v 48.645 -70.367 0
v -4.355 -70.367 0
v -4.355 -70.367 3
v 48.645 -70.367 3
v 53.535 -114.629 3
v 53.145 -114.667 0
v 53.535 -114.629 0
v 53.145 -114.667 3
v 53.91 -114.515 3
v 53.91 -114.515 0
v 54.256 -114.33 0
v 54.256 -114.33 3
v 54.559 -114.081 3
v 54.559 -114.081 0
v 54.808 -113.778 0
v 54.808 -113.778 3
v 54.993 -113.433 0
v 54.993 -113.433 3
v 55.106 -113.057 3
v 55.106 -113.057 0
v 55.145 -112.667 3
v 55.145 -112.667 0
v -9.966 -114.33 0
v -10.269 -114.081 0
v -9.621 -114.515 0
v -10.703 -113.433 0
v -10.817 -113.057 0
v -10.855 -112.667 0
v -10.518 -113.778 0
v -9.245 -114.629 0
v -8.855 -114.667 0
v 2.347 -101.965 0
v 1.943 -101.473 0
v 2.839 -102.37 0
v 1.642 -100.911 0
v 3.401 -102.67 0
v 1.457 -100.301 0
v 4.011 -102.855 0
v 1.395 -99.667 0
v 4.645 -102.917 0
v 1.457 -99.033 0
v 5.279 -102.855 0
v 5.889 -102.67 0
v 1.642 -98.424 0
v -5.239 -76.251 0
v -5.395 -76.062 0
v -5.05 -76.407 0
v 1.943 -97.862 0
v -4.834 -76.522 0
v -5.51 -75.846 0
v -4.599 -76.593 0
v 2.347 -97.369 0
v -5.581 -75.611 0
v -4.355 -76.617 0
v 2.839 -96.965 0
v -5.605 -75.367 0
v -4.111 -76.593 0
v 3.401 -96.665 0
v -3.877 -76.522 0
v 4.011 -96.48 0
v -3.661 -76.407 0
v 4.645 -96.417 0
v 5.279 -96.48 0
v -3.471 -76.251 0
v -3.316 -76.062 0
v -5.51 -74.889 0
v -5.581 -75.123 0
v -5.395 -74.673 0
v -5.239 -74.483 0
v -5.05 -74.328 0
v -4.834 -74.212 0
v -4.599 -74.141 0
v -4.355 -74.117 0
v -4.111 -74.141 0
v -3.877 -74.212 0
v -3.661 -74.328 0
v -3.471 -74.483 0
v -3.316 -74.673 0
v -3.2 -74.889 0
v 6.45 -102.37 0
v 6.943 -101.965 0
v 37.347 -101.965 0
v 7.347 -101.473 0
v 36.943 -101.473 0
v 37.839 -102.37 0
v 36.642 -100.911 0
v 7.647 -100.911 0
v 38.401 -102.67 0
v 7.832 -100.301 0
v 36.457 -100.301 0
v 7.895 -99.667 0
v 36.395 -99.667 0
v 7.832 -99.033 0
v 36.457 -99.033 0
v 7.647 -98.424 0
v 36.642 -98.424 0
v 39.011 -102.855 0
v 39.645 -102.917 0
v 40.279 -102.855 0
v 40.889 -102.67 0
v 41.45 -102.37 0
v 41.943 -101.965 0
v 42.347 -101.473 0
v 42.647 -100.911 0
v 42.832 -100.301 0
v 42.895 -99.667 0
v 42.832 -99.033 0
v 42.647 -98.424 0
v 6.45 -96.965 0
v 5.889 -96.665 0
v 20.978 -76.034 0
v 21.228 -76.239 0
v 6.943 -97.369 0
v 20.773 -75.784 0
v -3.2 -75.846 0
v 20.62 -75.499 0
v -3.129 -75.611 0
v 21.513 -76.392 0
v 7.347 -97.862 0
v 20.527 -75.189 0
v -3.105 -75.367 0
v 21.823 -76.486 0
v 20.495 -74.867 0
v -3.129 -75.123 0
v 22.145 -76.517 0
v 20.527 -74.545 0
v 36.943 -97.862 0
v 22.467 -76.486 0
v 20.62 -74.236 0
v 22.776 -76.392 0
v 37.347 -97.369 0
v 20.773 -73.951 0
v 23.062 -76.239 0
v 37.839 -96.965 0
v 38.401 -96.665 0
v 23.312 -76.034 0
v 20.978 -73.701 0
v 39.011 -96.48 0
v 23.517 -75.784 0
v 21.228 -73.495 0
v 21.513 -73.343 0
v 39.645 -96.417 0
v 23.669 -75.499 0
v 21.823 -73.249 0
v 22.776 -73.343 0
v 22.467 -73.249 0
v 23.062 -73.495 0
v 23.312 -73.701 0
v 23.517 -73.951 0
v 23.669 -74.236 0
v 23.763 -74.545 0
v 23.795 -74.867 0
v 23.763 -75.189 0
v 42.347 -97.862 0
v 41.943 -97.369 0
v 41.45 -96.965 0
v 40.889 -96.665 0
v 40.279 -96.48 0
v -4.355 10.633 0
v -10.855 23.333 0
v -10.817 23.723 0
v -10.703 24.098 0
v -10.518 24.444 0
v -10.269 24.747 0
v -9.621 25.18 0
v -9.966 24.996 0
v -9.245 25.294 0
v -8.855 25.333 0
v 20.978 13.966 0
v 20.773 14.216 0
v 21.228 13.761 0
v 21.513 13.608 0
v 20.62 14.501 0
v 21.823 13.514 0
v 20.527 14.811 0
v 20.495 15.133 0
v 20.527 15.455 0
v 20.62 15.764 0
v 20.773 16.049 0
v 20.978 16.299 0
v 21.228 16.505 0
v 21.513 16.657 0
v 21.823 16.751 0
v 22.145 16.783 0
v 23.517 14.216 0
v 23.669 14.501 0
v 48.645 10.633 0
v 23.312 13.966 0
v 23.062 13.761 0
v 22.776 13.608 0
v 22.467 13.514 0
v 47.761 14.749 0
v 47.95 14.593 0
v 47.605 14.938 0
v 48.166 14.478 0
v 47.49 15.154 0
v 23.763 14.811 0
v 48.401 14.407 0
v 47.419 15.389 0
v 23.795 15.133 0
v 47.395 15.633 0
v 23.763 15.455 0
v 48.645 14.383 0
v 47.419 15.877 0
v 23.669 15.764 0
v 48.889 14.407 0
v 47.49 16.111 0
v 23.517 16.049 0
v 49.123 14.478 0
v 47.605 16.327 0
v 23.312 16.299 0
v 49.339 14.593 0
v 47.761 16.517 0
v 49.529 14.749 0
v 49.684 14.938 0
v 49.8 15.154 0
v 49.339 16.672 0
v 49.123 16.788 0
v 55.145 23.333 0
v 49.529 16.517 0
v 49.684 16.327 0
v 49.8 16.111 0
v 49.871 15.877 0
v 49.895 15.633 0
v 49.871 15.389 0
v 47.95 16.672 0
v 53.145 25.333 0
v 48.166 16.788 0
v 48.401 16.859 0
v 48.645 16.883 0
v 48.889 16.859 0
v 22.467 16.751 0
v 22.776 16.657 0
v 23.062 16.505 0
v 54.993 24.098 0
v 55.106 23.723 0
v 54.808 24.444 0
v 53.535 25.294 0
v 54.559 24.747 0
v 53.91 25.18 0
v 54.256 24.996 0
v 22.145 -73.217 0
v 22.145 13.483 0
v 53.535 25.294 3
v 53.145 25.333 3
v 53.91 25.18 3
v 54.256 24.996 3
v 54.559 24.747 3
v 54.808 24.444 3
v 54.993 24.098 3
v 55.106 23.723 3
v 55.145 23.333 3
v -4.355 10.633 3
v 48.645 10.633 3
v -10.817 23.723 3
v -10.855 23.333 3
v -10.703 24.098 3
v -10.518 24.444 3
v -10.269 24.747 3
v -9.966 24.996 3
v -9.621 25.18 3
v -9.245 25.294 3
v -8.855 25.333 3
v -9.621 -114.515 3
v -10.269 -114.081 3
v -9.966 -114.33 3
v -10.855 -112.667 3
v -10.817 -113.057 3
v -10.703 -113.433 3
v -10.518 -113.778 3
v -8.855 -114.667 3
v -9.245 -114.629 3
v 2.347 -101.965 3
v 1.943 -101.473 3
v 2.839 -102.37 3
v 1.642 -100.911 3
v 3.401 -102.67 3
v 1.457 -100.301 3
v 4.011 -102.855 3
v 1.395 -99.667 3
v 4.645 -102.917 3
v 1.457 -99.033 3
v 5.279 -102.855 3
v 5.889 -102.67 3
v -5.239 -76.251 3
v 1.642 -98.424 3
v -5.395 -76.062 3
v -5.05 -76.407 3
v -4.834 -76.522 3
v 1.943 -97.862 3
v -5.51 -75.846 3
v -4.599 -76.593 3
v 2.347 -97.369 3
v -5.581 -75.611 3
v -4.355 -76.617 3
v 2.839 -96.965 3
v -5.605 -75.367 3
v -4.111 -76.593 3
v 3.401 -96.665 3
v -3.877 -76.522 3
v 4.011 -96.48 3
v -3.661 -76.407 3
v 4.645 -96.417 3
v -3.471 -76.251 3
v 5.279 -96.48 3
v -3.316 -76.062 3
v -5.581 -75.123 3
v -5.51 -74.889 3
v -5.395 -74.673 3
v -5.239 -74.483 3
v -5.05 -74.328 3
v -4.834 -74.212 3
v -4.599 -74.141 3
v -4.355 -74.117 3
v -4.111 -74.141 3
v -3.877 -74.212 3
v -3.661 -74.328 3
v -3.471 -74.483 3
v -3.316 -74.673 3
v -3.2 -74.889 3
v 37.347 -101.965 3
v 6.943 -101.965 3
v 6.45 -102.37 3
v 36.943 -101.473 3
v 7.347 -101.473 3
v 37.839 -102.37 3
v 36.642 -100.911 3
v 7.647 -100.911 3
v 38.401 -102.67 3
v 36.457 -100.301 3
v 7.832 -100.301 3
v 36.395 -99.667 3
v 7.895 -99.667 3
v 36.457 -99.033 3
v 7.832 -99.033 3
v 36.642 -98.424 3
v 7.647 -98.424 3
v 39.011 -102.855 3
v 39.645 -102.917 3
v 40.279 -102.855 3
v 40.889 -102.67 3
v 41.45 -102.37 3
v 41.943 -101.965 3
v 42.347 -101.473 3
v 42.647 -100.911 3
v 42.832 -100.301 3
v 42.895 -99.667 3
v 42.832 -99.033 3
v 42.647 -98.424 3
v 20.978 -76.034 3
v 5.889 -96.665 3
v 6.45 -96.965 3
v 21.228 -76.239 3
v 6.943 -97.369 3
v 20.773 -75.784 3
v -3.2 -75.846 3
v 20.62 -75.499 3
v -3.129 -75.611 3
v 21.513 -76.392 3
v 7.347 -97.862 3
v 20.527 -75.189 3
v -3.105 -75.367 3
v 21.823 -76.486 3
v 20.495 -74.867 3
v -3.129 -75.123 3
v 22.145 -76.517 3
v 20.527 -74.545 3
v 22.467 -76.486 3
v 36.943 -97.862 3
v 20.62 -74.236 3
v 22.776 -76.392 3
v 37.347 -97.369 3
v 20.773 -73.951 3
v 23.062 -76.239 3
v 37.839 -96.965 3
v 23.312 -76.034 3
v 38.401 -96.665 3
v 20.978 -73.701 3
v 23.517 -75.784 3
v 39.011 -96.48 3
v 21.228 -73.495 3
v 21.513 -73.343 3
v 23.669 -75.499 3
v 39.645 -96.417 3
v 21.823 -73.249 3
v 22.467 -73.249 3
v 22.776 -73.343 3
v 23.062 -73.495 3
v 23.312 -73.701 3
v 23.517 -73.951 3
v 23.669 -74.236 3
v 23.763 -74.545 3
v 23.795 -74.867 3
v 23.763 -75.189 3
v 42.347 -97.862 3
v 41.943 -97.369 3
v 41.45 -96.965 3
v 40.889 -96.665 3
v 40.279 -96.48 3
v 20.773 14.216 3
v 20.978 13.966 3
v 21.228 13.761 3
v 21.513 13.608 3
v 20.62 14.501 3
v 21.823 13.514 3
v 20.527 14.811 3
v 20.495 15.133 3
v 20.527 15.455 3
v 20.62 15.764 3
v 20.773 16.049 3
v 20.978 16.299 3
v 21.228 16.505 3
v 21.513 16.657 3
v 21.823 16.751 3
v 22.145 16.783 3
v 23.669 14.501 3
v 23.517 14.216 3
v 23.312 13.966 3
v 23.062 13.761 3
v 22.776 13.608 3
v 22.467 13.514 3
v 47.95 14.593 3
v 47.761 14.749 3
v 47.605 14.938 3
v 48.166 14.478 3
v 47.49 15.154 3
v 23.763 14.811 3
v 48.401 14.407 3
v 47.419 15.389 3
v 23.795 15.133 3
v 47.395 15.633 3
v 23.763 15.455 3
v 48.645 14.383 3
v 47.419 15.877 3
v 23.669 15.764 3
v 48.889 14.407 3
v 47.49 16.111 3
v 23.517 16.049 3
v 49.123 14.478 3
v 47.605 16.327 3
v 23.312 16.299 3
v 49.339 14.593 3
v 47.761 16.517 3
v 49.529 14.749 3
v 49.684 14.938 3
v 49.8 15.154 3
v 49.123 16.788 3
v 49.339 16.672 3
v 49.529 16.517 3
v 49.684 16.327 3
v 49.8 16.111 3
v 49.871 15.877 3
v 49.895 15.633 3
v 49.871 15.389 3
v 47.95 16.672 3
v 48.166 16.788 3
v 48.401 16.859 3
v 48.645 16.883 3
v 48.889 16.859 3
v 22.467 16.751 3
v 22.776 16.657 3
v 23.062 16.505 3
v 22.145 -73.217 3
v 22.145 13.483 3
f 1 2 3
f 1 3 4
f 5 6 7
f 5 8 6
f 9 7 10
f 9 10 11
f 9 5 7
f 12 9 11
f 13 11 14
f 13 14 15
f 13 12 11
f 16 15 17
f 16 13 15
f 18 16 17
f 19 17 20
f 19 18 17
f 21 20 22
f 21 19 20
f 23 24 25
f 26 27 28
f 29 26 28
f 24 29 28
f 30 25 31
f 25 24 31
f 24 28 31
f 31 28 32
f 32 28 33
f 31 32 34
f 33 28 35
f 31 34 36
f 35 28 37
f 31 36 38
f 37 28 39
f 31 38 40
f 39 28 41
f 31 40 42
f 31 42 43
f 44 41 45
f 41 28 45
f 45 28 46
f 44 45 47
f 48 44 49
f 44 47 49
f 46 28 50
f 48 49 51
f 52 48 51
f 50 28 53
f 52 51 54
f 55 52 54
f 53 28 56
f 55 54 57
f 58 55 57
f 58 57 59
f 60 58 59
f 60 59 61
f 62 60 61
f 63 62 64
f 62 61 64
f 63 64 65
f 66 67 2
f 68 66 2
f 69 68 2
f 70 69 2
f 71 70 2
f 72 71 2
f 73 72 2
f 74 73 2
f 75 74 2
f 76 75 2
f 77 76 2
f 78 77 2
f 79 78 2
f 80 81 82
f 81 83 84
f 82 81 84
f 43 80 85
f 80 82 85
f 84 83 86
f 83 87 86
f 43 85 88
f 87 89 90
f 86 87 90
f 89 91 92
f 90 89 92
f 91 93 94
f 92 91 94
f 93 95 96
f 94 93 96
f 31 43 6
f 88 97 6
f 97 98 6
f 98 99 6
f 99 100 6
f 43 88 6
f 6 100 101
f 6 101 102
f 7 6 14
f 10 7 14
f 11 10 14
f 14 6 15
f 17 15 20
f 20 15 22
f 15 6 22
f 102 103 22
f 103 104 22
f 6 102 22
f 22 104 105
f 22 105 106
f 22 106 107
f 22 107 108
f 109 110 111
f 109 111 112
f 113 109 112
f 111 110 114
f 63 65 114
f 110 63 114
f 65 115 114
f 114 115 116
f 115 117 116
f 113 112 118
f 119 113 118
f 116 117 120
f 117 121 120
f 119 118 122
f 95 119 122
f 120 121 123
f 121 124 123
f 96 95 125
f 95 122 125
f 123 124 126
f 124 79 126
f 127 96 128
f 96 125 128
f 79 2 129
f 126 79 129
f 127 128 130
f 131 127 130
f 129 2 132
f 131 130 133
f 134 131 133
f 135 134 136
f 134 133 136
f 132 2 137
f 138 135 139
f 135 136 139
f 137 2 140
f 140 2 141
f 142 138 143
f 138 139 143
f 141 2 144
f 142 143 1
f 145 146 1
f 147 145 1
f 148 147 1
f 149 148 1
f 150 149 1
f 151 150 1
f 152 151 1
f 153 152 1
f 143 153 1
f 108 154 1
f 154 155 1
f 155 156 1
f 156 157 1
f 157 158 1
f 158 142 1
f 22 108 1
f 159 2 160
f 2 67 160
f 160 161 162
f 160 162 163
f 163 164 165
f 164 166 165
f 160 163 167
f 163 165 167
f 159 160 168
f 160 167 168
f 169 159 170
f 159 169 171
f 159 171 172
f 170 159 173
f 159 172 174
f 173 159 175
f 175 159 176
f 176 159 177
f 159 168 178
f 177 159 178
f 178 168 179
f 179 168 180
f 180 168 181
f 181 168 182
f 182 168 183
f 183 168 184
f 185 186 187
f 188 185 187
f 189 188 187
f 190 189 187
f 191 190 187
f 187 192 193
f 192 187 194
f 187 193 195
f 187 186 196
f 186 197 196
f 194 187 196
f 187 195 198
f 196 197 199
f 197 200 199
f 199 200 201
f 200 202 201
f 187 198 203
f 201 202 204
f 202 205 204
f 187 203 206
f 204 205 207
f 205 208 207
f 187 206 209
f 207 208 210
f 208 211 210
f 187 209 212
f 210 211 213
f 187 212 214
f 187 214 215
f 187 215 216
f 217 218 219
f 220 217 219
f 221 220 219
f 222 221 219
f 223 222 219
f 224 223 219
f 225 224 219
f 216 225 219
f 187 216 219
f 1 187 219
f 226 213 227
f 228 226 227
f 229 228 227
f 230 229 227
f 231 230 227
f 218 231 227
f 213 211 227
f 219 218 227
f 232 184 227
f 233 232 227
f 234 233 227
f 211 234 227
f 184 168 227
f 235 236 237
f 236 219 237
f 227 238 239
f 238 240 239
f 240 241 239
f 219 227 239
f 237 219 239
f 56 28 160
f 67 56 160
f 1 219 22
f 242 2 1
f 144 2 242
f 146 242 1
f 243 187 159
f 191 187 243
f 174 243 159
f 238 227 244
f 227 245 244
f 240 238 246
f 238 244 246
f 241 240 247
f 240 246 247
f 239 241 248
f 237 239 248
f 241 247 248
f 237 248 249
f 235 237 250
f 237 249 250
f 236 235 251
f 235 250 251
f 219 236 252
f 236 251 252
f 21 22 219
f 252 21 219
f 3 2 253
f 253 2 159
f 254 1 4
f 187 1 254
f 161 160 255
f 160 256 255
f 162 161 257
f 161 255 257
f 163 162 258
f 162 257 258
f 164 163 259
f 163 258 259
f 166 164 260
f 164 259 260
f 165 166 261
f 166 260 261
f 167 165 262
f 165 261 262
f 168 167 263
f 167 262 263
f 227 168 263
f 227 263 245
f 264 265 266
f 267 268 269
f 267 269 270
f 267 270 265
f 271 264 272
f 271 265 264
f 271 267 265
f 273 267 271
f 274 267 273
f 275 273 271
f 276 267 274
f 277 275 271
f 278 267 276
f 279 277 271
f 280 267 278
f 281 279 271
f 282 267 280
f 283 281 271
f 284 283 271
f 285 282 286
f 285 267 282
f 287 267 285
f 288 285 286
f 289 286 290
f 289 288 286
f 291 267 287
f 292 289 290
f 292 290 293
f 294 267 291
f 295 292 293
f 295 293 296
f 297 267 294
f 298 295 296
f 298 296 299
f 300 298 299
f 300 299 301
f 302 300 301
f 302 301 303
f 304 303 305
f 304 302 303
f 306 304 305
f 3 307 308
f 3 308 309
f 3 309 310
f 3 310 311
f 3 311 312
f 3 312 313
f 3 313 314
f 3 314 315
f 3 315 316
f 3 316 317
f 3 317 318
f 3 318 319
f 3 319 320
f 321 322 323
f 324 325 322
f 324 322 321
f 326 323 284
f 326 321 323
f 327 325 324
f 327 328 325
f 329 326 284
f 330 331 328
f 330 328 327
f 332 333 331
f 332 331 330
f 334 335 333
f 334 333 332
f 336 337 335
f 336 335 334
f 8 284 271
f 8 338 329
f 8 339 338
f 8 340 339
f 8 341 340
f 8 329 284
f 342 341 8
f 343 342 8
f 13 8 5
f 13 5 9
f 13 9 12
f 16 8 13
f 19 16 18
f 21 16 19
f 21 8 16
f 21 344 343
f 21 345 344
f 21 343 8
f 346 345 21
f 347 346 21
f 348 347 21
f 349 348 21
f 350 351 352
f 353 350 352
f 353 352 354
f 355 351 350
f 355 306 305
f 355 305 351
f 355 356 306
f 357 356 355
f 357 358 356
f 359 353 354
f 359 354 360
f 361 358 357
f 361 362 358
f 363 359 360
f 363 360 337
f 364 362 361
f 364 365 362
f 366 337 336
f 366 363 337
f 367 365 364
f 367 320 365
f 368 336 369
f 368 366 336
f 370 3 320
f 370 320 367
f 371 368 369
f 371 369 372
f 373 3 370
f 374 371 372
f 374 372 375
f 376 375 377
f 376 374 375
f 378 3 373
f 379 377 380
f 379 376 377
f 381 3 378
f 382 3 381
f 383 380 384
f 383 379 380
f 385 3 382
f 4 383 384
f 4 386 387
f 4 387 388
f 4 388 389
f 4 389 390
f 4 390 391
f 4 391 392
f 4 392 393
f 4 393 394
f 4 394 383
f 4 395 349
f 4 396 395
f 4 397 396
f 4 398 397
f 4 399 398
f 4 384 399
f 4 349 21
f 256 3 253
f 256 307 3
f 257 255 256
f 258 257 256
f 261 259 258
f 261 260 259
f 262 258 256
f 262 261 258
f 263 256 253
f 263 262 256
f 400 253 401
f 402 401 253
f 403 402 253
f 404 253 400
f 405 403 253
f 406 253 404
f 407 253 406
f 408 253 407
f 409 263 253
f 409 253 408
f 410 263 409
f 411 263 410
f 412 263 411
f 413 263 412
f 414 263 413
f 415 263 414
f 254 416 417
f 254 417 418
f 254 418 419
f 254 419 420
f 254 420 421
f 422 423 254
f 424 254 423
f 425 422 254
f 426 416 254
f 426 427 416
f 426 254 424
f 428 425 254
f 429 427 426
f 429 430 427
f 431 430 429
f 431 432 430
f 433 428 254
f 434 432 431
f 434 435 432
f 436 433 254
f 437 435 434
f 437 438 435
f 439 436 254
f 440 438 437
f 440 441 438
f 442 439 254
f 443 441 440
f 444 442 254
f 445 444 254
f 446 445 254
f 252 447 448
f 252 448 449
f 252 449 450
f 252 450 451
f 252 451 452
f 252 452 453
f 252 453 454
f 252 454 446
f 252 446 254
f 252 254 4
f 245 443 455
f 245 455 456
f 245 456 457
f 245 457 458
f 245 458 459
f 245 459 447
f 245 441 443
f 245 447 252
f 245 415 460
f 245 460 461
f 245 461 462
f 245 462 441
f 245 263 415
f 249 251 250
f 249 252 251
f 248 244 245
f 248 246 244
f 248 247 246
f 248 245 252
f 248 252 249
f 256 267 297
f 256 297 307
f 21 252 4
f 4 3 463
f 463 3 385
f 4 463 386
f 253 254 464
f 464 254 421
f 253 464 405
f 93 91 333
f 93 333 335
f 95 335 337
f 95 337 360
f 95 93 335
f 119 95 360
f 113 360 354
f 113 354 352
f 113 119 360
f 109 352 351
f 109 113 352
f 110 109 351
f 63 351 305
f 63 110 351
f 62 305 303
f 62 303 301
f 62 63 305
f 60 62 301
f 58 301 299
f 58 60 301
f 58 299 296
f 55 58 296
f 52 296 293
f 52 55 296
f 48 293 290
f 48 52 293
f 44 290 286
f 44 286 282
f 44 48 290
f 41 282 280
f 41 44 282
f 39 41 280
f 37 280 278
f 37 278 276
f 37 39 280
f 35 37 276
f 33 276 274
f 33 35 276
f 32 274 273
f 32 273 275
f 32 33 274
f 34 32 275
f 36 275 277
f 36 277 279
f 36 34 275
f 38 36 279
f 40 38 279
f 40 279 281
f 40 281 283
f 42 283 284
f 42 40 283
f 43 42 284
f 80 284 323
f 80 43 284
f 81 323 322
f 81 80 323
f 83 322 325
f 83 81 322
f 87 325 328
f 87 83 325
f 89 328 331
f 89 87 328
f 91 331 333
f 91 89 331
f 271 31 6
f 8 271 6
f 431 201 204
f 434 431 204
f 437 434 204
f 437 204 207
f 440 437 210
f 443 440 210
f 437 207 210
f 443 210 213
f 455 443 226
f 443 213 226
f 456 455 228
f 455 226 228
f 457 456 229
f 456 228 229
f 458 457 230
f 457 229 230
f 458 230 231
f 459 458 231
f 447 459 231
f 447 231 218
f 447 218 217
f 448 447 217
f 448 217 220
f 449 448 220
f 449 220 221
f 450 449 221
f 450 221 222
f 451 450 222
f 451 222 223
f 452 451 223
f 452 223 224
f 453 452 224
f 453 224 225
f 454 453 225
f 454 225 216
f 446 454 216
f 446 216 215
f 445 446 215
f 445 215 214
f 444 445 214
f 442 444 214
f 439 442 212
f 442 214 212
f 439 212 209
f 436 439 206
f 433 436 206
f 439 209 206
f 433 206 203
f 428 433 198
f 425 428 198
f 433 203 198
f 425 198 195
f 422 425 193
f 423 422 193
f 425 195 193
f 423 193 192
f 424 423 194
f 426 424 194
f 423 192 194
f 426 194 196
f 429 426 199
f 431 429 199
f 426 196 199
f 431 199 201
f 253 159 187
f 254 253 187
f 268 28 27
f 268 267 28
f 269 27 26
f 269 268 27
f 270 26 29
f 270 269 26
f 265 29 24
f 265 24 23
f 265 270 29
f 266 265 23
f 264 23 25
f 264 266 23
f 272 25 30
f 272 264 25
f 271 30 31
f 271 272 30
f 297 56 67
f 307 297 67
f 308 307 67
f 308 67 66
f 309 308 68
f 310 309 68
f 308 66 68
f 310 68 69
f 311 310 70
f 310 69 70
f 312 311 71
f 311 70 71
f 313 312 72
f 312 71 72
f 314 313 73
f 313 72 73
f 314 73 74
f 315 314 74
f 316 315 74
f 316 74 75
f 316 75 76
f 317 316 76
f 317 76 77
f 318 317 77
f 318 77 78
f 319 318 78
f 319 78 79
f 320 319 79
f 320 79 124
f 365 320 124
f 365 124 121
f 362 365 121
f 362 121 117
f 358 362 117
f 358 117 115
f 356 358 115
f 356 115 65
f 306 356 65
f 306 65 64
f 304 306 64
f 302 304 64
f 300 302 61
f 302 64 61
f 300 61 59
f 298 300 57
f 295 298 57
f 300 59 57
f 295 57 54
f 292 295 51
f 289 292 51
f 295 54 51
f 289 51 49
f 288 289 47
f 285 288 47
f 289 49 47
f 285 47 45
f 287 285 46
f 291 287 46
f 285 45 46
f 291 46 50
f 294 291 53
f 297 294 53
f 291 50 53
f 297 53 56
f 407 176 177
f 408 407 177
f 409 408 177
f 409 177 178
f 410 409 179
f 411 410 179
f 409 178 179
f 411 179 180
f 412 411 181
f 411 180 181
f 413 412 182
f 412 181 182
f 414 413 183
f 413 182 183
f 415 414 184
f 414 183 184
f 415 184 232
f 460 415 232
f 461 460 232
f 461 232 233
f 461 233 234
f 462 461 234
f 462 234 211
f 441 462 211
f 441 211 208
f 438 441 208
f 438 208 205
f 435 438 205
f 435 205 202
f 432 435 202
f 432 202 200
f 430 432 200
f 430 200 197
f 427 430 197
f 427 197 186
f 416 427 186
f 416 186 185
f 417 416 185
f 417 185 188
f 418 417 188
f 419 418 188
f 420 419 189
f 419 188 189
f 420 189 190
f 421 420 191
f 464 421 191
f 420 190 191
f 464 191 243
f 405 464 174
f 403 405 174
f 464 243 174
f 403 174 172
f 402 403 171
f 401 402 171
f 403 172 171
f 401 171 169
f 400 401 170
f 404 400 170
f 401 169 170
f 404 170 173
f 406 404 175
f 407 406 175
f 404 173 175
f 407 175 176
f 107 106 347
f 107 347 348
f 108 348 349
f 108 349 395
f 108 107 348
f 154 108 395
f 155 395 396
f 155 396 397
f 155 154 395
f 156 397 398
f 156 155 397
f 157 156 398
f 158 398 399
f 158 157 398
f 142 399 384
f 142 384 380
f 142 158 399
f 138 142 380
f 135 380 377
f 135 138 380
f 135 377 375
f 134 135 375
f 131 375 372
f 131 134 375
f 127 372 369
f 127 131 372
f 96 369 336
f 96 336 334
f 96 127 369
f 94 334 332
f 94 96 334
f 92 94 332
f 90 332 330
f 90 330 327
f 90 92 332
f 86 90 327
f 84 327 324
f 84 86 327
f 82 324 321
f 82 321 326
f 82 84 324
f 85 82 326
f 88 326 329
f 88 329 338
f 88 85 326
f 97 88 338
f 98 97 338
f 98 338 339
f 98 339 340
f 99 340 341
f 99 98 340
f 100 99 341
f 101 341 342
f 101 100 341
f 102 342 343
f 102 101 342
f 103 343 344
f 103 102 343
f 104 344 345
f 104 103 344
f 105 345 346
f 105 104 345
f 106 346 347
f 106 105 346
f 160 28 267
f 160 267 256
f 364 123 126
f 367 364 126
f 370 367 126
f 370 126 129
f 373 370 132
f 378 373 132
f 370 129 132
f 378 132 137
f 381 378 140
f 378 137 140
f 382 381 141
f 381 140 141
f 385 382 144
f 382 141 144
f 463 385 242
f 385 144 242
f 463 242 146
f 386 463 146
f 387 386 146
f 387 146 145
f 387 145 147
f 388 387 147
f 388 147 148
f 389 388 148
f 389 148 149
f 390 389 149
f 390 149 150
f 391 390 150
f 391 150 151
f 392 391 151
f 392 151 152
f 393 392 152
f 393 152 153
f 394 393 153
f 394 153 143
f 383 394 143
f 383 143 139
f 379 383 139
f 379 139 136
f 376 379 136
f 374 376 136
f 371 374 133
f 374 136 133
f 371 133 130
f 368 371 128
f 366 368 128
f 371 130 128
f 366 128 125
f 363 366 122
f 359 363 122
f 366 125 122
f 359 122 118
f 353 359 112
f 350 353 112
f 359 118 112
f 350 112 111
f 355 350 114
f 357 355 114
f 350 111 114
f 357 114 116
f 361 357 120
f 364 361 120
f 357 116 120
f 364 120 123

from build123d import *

# Parameters (mm, degrees)
SKETCH1_W             = 66
SKETCH1_H             = 140
SKETCH1_R             = 3.25
SKETCH1_W_2           = 53
SKETCH1_H_2           = 81
BOSS_EXTRUDE1_DEPTH   = 3
FILLET1_R             = 2
M4X0_7_TAPPED_HOLE1_D = 3.3
M3X0_5_TAPPED_HOLE1_D = 2.5


with BuildPart() as part:
    # Sketch1 → Boss-Extrude1 (new body)
    with BuildSketch(Plane.XY):
        with Locations((22.144812637, -44.667286245)):
            Rectangle(SKETCH1_W, SKETCH1_H)
        with Locations((4.644812637, -99.667286245)):
            Circle(SKETCH1_R, mode=Mode.SUBTRACT)
        with Locations((39.644812637, -99.667286245)):
            Circle(SKETCH1_R, mode=Mode.SUBTRACT)
        with Locations((22.144812637, -29.867286245)):
            Rectangle(SKETCH1_W_2, SKETCH1_H_2, mode=Mode.SUBTRACT)
    extrude(amount=BOSS_EXTRUDE1_DEPTH)

    # Fillet1
    fillet1_edges = [part.edges().sort_by_distance(p)[0] for p in [
        (-10.855187363, 25.332713755, 1.5),
        (55.144812637, 25.332713755, 1.5),
        (55.144812637, -114.667286245, 1.5),
        (-10.855187363, -114.667286245, 1.5),
    ]]
    fillet(fillet1_edges, radius=FILLET1_R)

    # M4x0.7 Tapped Hole1 (through all)
    with Locations(Plane.XY.offset(3)):
        with Locations((22.144812637, 15.132713755), (22.144812637, -74.867286245)):
            Hole(M4X0_7_TAPPED_HOLE1_D / 2)

    # M3x0.5 Tapped Hole1 (through all)
    with Locations(Plane.XY.offset(3)):
        with Locations((48.644812637, 15.632713755), (-4.355187363, -75.367286245)):
            Hole(M3X0_5_TAPPED_HOLE1_D / 2)


solid = part.part
